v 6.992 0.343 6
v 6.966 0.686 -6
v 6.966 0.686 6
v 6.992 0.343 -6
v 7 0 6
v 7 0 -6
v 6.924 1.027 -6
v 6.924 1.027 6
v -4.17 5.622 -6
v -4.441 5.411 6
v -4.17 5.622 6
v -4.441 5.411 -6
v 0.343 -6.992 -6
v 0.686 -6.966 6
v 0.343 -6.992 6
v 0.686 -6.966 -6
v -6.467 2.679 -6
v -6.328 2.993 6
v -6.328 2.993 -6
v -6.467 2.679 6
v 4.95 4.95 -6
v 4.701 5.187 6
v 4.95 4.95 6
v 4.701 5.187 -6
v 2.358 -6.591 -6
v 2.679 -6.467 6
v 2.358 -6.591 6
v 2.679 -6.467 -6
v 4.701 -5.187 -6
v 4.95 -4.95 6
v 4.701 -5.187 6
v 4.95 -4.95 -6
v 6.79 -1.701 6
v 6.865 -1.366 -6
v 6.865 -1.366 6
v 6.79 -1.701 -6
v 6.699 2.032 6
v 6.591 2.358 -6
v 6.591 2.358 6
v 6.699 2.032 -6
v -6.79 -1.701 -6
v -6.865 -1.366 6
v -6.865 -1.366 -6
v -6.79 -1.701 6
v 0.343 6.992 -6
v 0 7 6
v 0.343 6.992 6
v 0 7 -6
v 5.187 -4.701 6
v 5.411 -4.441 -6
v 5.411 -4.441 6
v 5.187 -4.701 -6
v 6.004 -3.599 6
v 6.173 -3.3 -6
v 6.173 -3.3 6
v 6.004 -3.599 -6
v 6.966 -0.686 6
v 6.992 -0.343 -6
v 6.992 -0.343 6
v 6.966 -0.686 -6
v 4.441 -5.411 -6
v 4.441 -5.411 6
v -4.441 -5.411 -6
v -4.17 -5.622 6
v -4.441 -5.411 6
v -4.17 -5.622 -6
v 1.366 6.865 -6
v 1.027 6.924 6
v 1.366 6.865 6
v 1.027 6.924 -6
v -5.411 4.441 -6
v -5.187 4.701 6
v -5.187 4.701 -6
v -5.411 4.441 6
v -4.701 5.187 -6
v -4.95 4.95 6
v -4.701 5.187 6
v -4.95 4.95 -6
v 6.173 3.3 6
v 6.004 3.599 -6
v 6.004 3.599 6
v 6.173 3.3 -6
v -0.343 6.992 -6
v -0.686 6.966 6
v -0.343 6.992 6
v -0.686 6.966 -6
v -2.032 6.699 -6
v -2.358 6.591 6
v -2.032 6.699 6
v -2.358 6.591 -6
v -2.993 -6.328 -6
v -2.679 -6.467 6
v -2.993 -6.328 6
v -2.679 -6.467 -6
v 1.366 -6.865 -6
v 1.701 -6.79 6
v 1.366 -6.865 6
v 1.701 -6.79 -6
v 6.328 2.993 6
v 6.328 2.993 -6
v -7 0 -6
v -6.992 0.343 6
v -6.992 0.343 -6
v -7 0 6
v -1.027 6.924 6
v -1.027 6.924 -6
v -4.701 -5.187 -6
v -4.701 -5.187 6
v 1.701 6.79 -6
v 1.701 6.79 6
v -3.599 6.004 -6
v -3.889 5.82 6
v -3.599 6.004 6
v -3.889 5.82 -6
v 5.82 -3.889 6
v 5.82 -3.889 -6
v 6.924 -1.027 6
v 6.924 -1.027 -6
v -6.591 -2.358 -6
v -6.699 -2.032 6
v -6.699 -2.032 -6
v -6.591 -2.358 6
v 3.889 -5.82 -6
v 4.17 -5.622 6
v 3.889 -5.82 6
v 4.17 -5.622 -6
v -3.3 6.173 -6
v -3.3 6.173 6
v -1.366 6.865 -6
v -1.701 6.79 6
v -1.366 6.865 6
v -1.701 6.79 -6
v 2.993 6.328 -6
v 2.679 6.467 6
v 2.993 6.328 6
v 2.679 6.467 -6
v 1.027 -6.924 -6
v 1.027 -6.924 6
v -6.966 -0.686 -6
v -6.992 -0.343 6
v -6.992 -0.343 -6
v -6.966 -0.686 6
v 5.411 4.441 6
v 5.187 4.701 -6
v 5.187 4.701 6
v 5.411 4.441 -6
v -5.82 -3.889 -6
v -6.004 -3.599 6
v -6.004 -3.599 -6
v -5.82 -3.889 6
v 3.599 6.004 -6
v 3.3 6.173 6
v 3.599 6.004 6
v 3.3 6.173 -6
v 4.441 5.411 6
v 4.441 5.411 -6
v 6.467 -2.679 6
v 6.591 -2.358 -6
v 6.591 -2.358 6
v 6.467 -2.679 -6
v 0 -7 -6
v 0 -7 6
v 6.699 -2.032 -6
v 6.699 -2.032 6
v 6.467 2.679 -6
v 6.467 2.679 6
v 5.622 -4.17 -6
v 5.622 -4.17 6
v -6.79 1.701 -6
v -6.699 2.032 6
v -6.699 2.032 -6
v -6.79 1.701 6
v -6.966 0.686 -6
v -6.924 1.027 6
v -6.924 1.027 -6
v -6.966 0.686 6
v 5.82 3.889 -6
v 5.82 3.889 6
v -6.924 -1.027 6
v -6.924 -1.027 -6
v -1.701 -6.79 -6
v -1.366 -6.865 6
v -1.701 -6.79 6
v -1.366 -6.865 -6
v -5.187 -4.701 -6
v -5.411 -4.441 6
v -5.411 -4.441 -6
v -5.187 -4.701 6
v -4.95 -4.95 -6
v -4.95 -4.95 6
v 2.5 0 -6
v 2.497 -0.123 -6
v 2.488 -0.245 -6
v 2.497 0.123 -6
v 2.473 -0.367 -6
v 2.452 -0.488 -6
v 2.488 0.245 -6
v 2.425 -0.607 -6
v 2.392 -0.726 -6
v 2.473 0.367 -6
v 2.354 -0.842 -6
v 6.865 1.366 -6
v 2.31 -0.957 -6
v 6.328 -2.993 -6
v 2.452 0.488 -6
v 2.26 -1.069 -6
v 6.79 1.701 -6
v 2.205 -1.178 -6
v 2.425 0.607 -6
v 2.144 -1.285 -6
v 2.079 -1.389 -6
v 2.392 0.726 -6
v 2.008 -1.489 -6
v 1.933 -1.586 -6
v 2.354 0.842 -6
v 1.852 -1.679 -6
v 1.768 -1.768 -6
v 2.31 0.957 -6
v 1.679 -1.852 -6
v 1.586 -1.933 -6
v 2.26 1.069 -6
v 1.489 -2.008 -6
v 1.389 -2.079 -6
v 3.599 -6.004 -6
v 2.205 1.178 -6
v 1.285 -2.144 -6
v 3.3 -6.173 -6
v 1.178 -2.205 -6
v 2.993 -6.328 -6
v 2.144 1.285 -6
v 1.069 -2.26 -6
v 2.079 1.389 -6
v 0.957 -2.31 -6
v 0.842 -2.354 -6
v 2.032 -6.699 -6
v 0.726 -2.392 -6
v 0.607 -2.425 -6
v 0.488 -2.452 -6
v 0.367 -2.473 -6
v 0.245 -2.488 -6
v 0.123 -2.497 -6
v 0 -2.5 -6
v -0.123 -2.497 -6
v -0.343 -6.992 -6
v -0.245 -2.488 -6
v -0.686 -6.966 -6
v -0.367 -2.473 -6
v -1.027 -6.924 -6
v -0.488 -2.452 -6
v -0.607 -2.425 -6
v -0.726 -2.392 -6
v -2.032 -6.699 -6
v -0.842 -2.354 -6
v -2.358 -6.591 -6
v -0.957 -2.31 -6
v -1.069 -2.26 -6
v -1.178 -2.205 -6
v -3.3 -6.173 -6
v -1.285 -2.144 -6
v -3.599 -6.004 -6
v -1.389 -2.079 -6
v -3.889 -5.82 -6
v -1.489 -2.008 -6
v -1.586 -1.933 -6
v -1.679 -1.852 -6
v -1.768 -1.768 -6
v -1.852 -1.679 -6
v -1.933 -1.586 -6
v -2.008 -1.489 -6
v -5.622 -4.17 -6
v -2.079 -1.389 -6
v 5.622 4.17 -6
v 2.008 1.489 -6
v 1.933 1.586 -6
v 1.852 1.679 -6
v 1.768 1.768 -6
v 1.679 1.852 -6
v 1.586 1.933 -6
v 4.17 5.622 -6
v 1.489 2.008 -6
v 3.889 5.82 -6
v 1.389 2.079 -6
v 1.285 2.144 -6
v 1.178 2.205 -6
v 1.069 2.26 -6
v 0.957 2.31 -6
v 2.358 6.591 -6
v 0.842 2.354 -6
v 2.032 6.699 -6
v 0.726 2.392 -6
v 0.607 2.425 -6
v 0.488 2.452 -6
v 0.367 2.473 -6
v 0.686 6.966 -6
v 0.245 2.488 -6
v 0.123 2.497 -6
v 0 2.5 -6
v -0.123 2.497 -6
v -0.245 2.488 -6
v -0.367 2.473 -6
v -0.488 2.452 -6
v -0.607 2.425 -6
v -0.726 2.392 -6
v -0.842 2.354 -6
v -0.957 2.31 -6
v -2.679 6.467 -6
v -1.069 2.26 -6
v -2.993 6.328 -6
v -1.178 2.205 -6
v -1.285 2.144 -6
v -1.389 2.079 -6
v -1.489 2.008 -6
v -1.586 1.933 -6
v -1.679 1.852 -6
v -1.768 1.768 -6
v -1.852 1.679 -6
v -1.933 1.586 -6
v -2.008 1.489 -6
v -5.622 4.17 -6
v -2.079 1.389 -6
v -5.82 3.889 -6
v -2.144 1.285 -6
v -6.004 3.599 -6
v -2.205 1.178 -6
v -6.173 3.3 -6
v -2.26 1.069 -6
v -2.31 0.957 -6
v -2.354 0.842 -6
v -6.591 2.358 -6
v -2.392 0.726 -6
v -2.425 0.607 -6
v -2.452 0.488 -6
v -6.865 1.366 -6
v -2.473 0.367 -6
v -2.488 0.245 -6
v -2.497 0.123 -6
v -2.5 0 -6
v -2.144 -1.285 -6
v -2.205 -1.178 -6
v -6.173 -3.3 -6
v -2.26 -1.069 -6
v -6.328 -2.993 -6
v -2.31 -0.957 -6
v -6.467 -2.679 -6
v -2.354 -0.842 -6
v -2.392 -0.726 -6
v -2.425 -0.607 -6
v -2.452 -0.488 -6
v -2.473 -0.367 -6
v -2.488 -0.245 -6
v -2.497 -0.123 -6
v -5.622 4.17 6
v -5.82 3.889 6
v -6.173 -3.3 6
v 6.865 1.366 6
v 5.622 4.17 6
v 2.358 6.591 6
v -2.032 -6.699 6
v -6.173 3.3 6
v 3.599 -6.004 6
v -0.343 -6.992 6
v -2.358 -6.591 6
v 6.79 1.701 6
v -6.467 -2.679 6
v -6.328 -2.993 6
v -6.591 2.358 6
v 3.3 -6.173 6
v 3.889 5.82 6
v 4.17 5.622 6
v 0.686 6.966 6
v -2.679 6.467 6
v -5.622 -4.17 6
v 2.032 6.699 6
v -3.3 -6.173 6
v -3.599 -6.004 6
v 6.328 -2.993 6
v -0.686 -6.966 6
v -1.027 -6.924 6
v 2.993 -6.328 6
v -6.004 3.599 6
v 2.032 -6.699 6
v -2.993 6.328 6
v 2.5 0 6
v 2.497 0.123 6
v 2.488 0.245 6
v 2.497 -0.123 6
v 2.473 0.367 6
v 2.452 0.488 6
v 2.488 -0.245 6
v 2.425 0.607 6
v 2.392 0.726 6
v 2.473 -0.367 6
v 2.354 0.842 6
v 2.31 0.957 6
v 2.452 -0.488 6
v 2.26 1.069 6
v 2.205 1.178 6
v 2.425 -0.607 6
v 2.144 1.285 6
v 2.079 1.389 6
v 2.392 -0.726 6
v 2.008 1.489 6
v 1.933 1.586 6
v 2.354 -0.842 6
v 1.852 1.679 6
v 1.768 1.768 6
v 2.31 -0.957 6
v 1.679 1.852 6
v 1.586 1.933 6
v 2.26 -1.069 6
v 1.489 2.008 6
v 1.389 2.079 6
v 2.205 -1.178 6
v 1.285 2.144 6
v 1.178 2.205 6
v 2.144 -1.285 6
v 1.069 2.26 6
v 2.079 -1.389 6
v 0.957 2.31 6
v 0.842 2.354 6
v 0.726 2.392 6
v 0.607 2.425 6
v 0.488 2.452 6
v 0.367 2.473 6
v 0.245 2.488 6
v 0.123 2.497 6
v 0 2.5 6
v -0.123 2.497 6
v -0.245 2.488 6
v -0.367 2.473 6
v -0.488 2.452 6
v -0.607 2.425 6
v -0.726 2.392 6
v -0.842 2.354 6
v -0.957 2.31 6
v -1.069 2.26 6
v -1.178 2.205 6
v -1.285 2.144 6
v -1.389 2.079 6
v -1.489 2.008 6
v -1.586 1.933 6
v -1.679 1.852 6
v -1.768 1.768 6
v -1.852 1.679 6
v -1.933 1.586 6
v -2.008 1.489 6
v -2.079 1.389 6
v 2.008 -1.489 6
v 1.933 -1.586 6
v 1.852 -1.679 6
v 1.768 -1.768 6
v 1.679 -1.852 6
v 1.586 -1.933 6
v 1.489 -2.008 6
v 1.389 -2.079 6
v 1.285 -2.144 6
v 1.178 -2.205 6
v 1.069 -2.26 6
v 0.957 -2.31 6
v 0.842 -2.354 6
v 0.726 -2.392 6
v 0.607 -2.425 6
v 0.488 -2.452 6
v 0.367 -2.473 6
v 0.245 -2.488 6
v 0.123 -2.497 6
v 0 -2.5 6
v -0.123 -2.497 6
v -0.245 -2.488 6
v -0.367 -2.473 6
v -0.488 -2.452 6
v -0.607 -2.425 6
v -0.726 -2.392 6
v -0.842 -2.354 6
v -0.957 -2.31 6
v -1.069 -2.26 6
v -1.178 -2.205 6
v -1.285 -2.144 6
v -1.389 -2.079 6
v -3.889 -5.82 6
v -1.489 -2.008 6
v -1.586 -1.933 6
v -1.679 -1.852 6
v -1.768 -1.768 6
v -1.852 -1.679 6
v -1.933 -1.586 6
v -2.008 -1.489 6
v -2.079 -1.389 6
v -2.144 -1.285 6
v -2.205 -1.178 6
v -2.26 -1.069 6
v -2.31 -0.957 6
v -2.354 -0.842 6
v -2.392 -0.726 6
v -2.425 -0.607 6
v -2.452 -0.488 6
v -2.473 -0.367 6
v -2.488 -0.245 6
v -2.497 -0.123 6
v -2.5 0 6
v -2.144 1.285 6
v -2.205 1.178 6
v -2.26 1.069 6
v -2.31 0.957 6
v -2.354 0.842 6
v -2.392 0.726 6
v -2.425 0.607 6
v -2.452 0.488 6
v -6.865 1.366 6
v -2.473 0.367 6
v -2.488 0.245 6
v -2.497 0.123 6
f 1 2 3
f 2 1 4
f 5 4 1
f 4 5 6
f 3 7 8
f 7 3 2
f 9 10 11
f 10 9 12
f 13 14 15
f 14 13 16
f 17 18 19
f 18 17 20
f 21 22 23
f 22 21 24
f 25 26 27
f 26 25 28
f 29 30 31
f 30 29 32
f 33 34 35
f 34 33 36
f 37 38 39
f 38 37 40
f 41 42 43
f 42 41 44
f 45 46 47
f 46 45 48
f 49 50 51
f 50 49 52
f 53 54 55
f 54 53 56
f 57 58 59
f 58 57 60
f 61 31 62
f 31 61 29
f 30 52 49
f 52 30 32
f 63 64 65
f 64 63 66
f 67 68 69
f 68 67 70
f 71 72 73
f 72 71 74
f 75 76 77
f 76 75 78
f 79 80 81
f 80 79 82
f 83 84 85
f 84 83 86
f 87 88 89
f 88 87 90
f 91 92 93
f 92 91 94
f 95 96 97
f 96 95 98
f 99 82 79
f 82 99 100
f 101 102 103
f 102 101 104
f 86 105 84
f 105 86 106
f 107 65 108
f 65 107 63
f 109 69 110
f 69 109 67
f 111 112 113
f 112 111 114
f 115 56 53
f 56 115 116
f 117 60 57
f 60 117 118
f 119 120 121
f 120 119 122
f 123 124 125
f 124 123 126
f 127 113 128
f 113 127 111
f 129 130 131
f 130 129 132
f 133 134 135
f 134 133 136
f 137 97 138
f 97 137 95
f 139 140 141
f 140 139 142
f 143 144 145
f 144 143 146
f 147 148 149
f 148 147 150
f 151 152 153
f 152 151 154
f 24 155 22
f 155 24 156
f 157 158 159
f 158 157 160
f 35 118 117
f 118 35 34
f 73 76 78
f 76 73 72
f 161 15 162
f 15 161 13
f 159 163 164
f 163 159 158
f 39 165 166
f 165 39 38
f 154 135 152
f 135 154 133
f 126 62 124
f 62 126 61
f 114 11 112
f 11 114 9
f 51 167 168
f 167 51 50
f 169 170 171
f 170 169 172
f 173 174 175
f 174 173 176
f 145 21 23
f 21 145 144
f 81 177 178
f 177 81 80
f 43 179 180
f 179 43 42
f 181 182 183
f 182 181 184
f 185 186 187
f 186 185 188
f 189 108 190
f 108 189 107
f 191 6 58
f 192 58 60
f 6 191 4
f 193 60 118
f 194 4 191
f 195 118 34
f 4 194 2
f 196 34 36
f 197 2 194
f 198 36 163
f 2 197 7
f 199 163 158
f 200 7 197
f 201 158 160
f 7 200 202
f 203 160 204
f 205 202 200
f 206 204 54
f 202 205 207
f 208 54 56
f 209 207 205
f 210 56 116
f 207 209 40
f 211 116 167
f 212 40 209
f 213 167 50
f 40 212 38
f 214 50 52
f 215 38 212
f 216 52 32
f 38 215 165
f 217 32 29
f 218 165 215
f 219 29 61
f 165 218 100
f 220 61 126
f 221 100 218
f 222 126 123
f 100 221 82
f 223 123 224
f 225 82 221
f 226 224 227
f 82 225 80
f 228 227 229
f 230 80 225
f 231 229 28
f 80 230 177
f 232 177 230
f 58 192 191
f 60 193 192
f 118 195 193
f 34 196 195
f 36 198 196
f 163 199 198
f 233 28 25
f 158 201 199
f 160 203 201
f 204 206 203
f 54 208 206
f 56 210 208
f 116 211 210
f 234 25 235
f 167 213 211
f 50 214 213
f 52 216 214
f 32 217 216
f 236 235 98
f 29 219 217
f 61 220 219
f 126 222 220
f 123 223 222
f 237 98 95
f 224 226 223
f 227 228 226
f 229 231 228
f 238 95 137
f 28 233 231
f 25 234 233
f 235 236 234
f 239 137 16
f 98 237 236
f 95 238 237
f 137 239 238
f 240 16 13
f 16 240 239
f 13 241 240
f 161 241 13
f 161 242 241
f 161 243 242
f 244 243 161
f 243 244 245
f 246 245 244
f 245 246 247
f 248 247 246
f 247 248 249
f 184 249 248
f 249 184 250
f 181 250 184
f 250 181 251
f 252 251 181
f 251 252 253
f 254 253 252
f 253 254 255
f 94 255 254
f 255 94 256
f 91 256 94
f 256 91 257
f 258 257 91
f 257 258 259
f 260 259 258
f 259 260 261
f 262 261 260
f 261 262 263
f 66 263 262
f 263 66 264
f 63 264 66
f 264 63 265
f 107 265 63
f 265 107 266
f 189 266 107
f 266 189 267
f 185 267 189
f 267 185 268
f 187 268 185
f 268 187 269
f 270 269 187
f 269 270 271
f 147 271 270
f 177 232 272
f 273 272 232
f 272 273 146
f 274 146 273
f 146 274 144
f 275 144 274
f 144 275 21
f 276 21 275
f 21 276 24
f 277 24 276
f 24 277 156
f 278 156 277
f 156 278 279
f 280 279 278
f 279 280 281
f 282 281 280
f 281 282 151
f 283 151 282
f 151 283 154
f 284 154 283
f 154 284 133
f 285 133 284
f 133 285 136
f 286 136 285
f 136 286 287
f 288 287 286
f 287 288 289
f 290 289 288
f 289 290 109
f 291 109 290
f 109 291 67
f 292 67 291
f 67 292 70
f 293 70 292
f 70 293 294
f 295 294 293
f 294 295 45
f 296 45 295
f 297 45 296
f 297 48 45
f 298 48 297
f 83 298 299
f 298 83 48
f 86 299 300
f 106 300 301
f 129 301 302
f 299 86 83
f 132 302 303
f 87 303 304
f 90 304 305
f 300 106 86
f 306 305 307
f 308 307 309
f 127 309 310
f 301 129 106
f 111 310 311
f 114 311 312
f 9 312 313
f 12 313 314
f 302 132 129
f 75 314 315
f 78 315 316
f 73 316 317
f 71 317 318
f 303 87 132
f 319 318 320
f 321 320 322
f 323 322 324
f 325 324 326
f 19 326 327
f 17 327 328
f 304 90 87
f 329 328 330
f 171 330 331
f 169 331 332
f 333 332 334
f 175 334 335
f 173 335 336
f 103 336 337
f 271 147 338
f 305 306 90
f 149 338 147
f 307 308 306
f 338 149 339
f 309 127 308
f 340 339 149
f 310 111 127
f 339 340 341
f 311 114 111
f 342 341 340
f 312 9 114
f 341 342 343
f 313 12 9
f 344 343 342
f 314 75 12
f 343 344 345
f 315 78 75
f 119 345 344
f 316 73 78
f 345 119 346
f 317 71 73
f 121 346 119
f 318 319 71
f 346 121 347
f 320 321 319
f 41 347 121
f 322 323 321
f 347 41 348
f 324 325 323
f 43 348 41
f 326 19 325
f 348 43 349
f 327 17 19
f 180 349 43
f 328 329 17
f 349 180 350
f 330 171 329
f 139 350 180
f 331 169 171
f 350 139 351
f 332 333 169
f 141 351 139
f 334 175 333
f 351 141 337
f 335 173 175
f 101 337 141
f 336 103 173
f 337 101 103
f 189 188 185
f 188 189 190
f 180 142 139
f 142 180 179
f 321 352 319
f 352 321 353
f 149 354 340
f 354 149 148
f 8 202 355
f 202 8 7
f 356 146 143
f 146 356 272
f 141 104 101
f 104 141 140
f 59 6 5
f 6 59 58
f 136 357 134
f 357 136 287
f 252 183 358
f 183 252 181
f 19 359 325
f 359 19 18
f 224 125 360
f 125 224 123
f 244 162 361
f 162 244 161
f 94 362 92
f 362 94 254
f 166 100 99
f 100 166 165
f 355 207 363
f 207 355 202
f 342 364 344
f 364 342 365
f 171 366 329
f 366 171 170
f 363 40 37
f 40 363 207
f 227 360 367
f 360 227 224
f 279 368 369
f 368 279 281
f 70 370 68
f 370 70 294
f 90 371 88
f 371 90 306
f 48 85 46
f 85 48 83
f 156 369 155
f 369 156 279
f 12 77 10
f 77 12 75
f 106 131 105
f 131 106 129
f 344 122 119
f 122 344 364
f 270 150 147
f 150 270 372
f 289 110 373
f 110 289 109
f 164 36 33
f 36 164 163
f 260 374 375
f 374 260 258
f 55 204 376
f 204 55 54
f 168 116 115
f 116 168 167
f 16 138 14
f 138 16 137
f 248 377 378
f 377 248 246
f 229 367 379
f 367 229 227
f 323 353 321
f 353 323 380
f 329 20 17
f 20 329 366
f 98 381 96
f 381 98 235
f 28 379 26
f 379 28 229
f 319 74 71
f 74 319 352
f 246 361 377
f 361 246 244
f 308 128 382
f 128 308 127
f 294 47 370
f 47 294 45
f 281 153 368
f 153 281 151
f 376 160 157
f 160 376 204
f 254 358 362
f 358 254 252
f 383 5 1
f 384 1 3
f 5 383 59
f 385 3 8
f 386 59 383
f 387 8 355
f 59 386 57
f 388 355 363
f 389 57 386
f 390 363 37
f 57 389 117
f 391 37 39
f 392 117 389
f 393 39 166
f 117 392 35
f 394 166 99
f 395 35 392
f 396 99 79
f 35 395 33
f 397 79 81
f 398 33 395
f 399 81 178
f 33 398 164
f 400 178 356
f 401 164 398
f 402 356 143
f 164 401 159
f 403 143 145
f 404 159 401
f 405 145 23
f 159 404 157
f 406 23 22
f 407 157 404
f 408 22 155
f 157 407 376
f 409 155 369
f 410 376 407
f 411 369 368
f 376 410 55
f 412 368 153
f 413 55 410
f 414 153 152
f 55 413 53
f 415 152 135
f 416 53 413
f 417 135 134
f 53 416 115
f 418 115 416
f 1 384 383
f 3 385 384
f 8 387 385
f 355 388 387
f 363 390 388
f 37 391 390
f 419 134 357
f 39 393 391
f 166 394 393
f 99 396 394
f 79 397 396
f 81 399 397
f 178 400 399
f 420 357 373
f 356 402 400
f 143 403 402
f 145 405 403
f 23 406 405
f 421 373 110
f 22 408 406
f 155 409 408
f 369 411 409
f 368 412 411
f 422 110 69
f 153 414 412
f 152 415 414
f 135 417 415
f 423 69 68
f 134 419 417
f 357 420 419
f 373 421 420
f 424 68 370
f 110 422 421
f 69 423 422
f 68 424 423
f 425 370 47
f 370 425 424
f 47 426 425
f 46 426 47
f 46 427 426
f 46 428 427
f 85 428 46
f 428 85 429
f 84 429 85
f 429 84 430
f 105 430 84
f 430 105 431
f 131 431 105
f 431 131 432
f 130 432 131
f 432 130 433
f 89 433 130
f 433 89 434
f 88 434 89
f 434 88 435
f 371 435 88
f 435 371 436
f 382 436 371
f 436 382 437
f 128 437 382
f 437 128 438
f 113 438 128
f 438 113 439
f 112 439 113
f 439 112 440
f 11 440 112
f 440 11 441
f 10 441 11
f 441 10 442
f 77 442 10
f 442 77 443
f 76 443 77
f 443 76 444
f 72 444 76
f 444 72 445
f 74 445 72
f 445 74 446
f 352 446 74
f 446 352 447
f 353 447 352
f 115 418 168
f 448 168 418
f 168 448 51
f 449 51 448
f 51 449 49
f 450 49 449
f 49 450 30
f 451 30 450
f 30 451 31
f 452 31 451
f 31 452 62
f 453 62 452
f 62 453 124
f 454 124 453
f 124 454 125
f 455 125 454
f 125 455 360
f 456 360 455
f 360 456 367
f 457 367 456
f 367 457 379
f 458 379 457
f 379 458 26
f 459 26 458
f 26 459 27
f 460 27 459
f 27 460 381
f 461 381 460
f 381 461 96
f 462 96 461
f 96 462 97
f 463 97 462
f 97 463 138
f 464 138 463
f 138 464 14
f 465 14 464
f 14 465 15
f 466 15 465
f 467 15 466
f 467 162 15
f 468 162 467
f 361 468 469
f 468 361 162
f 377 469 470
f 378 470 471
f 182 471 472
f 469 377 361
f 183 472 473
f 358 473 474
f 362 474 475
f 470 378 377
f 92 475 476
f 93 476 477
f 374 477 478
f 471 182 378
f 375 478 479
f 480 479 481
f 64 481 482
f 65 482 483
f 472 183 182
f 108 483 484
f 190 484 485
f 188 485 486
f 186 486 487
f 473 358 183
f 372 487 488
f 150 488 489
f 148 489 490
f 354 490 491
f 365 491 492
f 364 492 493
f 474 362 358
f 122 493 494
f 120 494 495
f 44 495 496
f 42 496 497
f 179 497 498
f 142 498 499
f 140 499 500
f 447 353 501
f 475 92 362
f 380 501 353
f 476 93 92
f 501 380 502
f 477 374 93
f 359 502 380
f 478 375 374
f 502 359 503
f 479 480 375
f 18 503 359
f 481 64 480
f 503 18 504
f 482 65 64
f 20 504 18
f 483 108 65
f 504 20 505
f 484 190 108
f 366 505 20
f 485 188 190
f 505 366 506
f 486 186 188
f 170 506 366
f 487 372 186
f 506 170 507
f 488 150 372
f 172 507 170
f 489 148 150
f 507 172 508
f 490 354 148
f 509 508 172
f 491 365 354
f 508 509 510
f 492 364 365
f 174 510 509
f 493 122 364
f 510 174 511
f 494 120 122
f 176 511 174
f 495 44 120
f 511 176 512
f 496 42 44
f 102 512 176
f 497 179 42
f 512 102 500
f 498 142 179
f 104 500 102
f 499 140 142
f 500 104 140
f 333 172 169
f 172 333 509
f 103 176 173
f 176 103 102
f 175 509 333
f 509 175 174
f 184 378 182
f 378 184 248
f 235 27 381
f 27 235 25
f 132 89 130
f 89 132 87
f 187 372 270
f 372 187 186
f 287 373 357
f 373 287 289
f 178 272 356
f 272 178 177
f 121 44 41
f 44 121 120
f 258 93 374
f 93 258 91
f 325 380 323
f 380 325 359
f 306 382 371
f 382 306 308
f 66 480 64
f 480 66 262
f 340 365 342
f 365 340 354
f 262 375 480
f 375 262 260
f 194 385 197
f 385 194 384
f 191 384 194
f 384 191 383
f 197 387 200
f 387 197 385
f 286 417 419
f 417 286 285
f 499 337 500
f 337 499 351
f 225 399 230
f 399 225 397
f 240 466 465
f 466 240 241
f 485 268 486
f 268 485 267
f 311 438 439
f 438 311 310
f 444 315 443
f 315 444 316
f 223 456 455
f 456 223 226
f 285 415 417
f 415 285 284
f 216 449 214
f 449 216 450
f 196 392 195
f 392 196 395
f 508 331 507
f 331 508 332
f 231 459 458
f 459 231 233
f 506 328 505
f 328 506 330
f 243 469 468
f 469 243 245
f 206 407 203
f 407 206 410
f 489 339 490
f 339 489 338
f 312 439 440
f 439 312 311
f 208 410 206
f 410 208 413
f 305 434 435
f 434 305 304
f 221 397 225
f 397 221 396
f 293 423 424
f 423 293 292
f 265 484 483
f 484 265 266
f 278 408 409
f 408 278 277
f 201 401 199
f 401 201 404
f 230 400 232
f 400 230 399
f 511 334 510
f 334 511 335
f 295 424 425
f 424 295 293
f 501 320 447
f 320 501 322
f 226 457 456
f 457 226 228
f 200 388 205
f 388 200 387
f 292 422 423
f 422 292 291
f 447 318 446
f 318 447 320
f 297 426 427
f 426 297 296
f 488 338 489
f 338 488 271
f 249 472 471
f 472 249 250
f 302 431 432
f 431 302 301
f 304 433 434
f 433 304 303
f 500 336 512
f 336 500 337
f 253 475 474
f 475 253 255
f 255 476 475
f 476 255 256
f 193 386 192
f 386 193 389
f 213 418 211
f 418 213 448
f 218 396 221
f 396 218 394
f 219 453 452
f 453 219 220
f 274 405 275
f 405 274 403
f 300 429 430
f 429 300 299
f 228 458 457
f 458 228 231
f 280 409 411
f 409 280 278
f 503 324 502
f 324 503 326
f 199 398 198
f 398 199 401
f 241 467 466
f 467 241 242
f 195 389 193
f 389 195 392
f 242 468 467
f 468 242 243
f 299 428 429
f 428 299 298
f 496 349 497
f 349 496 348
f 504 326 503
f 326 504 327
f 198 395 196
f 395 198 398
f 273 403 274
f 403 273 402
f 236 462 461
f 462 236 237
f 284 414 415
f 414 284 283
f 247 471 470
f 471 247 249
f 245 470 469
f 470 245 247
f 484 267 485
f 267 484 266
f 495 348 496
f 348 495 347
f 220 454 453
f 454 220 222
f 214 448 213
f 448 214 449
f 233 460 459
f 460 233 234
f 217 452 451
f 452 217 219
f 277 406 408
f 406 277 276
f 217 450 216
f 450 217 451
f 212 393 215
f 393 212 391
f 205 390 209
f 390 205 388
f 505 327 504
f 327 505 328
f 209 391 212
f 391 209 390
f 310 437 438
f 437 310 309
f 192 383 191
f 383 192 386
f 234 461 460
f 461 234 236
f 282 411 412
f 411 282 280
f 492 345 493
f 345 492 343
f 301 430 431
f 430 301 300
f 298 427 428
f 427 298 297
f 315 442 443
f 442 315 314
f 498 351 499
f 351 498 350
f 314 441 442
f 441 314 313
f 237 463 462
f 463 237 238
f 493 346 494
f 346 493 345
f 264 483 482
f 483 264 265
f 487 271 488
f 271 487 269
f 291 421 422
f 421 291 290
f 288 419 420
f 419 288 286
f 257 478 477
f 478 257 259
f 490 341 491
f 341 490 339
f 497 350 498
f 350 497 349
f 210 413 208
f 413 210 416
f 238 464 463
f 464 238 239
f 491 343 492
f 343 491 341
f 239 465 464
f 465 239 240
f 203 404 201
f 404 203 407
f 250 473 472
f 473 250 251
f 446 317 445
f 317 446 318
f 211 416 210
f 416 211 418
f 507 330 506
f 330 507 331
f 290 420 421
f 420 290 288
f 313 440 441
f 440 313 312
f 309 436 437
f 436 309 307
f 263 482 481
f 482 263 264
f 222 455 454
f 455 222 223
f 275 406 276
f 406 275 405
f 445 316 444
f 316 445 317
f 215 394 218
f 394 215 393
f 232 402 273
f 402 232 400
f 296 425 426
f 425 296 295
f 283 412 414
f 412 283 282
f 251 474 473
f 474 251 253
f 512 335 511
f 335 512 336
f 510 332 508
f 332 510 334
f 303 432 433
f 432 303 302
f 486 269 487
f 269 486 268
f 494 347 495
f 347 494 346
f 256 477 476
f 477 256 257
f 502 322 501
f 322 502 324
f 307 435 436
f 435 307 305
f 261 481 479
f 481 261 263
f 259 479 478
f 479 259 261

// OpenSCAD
$fn=128;

teeth = 16;
pitch_d = 9.65;
pitch_r = pitch_d/2;

pulley_w = 10;
hub_d = 14;
hub_w = 12;

bore_d = 5;

tooth_height = 1.2;
tooth_tip_w = 1.0;
tooth_root_w = 2.0;

root_r = pitch_r - tooth_height*0.55;
tip_r  = pitch_r + tooth_height*0.45;

module tooth2d(tip_w, root_w, h) {
    polygon(points=[
        [-root_w/2, 0],
        [ root_w/2, 0],
        [ tip_w/2,  h],
        [-tip_w/2,  h]
    ]);
}

module teeth_ring(teeth, root_r, tip_r, tip_w, root_w, w) {
    for(i=[0:teeth-1]) {
        rotate([0,0, i*360/teeth])
            translate([root_r,0,0])
                linear_extrude(height=w, center=true, convexity=10)
                    tooth2d(tip_w, root_w, tip_r-root_r);
    }
}

module pulley_body() {
    union() {
        cylinder(d=2*root_r, h=pulley_w, center=true);
        teeth_ring(teeth, root_r, tip_r, tooth_tip_w, tooth_root_w, pulley_w);
        cylinder(d=hub_d, h=hub_w, center=true);
    }
}

difference() {
    pulley_body();
    cylinder(d=bore_d, h=hub_w+2, center=true);
}
